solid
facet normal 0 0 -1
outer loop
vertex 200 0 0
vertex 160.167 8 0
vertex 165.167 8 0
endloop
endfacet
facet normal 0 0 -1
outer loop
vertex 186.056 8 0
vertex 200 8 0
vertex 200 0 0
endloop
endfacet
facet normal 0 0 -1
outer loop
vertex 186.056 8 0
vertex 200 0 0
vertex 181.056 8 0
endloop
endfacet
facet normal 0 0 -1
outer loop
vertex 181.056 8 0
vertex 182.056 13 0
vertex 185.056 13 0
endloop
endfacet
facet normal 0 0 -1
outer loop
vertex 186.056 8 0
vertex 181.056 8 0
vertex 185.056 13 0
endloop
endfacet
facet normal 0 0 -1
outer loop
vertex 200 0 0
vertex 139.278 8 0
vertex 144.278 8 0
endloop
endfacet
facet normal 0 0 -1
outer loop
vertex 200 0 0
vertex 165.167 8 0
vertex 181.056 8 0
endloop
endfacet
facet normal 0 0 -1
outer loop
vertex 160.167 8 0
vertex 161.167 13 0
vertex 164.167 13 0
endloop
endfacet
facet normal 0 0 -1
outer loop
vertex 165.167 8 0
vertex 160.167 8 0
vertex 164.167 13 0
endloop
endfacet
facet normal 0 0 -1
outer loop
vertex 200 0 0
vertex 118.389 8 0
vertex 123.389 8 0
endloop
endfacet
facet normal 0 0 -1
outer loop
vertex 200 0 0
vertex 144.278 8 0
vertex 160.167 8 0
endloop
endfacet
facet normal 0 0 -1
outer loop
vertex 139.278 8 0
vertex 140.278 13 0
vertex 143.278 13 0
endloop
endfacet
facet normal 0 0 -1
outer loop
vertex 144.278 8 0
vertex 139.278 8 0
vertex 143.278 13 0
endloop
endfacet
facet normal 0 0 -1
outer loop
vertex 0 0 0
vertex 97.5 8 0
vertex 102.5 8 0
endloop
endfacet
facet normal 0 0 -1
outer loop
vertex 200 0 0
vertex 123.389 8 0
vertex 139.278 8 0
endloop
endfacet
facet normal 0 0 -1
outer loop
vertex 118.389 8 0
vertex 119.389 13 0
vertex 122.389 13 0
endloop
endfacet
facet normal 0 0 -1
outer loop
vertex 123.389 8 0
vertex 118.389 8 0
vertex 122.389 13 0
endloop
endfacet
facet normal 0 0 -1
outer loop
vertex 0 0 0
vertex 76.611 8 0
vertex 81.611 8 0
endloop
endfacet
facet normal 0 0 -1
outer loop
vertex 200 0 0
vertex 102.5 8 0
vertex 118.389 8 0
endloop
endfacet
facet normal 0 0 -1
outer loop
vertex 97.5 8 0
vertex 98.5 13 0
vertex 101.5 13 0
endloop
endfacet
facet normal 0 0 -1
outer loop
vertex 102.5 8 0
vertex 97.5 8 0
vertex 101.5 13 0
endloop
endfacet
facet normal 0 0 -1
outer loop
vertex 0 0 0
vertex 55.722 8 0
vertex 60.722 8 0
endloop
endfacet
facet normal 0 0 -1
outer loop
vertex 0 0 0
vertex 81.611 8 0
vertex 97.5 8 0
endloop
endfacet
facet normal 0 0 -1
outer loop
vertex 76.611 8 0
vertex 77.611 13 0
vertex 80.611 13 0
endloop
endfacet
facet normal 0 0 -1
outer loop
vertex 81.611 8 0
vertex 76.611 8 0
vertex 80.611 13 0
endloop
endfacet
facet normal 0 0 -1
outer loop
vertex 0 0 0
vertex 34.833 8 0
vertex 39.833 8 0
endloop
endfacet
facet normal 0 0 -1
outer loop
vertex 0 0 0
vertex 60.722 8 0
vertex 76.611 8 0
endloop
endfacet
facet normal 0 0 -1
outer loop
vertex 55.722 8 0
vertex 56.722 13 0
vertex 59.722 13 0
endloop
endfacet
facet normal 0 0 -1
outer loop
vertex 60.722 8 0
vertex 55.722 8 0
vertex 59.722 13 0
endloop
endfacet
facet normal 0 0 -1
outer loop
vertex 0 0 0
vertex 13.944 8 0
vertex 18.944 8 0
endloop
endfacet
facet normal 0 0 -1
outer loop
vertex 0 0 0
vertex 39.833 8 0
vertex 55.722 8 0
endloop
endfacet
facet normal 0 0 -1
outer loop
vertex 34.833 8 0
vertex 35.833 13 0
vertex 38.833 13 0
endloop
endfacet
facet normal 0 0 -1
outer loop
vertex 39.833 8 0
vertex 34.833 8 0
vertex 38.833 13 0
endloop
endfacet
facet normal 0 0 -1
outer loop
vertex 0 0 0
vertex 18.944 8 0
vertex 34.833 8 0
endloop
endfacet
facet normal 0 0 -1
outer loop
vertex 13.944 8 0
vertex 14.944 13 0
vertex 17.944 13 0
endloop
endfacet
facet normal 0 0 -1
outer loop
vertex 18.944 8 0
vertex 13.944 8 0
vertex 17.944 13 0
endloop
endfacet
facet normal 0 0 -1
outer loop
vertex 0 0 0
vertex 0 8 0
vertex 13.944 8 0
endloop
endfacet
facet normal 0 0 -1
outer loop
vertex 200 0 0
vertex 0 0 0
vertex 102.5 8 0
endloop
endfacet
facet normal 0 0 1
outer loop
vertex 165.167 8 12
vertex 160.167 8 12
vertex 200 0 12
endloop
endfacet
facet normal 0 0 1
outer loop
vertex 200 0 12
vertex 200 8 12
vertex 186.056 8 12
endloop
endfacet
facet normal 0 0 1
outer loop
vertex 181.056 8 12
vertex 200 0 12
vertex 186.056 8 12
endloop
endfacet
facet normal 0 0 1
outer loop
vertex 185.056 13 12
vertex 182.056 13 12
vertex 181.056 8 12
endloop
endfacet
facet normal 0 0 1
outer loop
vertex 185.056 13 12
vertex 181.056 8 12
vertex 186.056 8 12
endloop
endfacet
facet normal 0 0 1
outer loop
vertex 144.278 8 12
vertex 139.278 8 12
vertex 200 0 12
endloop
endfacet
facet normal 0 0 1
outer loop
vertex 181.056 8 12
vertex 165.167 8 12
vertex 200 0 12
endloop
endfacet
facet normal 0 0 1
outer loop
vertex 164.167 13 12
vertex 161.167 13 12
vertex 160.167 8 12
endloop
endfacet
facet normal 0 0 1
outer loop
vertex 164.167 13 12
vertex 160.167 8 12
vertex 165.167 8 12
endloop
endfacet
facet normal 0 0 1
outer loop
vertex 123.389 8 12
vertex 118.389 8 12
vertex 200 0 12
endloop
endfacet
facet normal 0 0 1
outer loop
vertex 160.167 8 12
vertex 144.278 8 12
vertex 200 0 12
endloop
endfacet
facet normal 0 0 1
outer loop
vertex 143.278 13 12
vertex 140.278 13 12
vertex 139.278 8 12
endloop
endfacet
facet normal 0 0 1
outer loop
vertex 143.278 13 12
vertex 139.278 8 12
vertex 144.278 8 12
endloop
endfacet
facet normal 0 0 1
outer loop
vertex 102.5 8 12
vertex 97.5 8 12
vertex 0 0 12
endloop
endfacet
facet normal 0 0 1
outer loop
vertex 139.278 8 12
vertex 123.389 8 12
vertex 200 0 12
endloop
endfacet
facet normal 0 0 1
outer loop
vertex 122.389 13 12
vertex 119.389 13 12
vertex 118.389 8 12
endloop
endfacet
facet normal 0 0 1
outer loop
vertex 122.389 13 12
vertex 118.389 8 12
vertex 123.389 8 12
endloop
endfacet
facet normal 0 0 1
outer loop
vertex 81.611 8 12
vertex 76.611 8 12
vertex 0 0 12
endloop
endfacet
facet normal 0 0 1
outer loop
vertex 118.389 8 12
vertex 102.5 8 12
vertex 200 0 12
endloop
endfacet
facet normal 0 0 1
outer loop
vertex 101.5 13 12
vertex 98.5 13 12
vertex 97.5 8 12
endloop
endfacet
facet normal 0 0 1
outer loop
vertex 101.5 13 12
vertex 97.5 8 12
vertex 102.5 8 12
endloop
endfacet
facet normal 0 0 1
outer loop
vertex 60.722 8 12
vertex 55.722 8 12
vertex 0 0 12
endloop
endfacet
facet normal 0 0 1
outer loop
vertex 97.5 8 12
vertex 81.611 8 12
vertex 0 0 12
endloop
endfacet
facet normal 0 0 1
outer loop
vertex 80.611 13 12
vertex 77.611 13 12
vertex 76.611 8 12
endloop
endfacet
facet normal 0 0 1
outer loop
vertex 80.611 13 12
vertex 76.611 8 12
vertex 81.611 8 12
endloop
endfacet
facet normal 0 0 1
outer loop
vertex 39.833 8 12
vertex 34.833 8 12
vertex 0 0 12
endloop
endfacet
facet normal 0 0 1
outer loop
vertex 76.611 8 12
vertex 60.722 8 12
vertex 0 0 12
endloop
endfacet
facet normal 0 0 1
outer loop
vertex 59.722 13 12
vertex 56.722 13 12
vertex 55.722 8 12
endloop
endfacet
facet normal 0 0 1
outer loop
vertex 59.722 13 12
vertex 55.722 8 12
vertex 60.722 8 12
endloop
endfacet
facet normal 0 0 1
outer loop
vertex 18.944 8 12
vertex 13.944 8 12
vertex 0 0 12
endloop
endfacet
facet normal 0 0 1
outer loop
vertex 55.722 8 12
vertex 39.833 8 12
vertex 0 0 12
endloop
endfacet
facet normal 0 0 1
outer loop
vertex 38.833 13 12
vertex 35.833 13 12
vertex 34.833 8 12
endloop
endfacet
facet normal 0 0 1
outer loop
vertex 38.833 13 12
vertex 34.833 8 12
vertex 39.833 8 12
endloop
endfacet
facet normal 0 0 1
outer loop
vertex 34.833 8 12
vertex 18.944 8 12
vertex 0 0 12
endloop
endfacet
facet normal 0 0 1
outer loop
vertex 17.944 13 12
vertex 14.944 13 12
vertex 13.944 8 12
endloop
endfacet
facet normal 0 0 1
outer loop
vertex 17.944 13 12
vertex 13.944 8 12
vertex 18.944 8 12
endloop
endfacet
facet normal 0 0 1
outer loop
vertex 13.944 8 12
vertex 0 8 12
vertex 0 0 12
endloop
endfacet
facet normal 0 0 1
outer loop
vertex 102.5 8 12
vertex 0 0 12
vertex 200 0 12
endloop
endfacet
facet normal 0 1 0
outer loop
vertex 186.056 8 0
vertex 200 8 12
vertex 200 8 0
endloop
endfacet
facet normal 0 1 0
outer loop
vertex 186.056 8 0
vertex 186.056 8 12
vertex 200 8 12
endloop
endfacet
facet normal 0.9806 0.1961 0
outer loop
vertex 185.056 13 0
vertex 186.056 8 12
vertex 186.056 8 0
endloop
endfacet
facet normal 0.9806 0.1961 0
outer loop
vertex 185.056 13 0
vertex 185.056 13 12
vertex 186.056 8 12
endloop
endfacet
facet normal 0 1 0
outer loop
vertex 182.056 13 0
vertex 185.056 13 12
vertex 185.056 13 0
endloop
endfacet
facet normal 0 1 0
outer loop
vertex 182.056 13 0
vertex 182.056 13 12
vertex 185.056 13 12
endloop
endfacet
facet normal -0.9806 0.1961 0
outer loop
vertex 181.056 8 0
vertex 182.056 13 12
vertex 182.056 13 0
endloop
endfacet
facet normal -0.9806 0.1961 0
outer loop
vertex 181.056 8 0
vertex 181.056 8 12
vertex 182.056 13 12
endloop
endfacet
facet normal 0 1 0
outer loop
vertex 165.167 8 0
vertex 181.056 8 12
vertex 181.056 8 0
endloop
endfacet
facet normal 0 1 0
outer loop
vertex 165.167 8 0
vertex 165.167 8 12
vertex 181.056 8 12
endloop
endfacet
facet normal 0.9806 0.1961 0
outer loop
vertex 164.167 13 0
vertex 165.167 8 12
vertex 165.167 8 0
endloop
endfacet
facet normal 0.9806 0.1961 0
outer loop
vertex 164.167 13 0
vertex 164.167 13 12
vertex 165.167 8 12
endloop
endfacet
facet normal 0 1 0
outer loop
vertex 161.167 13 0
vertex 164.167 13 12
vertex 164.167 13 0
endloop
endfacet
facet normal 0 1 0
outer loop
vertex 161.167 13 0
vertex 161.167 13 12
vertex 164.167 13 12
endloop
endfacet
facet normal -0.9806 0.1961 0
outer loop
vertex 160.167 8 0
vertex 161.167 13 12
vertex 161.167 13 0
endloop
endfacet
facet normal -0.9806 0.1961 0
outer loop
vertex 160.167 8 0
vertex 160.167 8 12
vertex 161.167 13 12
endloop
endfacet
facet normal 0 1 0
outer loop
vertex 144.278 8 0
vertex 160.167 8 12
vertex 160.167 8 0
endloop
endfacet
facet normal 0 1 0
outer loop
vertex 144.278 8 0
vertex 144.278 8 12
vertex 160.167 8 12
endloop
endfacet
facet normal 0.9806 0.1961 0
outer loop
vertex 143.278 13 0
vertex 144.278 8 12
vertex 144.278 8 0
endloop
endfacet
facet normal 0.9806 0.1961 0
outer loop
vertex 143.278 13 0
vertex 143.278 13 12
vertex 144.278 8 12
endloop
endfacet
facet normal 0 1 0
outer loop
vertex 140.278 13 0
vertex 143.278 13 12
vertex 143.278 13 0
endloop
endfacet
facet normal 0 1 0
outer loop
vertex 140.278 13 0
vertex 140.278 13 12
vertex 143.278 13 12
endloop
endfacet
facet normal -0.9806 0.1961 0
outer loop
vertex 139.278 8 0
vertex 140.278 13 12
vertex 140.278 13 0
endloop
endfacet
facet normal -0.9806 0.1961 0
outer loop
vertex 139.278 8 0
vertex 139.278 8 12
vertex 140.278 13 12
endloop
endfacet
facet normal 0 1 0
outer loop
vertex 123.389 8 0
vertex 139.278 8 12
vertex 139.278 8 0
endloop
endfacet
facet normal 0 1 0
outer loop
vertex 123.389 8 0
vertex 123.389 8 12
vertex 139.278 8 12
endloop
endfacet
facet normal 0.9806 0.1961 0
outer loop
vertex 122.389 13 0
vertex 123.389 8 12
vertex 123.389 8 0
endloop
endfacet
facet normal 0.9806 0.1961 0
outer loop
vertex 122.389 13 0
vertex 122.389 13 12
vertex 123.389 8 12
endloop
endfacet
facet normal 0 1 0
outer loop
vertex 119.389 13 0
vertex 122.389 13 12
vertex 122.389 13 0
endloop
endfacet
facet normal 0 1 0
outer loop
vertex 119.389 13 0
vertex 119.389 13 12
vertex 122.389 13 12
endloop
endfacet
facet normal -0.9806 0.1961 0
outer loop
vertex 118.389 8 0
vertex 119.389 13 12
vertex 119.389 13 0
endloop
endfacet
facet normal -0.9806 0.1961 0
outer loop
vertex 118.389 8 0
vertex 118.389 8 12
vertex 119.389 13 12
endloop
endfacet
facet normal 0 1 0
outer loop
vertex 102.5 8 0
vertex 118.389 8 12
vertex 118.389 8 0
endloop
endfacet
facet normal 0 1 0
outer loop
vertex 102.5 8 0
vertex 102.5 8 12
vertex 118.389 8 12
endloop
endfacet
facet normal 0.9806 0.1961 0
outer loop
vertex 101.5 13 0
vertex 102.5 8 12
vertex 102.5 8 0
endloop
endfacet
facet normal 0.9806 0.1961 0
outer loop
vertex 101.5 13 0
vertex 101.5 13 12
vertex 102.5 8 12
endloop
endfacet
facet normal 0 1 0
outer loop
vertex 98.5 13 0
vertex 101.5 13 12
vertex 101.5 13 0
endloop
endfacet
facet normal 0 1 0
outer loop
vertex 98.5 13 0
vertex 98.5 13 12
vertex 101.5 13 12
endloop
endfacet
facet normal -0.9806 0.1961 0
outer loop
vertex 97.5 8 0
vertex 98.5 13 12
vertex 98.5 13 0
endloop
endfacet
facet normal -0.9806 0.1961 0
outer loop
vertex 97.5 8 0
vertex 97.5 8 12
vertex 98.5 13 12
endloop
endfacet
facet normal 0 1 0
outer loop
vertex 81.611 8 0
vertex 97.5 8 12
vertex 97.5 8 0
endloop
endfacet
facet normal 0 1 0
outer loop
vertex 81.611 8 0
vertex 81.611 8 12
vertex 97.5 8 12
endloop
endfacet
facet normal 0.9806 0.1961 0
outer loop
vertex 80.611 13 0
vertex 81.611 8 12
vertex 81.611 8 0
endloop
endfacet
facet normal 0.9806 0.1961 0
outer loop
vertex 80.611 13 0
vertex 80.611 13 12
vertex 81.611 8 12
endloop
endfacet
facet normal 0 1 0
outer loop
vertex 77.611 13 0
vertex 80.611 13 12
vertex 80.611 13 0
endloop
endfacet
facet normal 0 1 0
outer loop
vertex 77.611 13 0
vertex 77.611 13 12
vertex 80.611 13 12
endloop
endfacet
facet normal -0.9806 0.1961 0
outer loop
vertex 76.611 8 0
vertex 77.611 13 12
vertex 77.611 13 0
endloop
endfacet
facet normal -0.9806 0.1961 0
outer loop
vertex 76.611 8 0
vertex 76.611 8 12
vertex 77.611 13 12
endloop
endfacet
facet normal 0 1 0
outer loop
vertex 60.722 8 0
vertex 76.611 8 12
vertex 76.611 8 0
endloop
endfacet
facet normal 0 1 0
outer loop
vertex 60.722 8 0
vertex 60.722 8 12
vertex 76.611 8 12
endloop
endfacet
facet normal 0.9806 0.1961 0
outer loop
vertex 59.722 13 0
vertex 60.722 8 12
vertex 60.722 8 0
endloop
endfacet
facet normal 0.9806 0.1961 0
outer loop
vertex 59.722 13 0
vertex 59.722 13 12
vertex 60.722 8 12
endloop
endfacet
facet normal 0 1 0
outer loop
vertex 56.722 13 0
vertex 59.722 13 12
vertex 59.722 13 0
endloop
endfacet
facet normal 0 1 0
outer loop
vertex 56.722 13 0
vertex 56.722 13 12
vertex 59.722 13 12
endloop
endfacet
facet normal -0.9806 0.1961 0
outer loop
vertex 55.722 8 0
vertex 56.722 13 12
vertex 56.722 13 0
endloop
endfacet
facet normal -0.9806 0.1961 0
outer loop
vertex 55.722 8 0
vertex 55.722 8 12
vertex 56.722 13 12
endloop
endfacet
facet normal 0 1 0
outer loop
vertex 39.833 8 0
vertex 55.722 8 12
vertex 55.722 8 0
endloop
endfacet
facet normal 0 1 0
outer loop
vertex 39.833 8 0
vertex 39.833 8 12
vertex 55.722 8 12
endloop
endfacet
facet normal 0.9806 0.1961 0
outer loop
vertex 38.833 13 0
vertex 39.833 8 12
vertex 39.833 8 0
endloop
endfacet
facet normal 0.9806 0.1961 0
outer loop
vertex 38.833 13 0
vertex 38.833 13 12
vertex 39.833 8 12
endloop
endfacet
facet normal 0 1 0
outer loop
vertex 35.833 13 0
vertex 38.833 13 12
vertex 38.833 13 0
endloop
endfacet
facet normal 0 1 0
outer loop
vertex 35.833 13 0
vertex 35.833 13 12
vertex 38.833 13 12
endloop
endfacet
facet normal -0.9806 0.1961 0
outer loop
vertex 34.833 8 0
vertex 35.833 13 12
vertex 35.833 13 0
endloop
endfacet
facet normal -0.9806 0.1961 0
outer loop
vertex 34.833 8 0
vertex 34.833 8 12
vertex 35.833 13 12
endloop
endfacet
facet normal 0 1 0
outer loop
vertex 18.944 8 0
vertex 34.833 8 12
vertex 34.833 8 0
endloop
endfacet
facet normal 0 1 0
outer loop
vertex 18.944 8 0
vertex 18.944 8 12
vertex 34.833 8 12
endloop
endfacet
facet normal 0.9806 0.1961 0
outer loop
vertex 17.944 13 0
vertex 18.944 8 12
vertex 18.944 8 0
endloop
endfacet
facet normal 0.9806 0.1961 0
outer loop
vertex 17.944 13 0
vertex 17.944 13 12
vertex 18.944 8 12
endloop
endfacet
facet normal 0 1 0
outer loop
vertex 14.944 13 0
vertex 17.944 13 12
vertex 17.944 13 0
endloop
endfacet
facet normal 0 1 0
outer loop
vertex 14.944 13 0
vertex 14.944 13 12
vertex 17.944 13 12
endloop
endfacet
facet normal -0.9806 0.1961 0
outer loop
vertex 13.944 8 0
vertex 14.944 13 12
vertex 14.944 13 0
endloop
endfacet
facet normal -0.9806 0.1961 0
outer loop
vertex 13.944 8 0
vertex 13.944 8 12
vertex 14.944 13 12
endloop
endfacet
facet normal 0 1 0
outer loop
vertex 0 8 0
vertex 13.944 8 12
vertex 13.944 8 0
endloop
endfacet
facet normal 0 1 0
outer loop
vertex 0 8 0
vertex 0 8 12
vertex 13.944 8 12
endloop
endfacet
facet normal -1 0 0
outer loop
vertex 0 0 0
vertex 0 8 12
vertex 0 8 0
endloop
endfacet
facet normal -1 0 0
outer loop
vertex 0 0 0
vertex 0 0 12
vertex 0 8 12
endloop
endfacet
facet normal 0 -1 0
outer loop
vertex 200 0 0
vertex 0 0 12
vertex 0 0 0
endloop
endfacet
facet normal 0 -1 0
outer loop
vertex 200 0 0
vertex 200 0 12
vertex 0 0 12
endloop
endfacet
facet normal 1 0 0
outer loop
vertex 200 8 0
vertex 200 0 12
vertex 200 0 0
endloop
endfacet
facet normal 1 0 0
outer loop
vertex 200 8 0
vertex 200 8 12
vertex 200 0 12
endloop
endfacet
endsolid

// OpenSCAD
$fn = 32;

// ----------------------------------------------------------------------
// Gear rack: 9 teeth on a 200 mm bar, pitch 20.89 mm
// ----------------------------------------------------------------------

// --- parameters (mm) ---
profile_height = 12;      // extrusion height
profile_points = 40;      // points of the closed outline

profile = [[0, 0], [200, 0], [200, 8], [186.056, 8], [185.056, 13], [182.056, 13], [181.056, 8], [165.167, 8], [164.167, 13], [161.167, 13], [160.167, 8], [144.278, 8], [143.278, 13], [140.278, 13], [139.278, 8], [123.389, 8], [122.389, 13], [119.389, 13], [118.389, 8], [102.5, 8], [101.5, 13], [98.5, 13], [97.5, 8], [81.611, 8], [80.611, 13], [77.611, 13], [76.611, 8], [60.722, 8], [59.722, 13], [56.722, 13], [55.722, 8], [39.833, 8], [38.833, 13], [35.833, 13], [34.833, 8], [18.944, 8], [17.944, 13], [14.944, 13], [13.944, 8], [0, 8]];  // single closed polygon, 40 points, counter clockwise

// --- the one profile operation ---
linear_extrude(height = profile_height) polygon(points = profile);
